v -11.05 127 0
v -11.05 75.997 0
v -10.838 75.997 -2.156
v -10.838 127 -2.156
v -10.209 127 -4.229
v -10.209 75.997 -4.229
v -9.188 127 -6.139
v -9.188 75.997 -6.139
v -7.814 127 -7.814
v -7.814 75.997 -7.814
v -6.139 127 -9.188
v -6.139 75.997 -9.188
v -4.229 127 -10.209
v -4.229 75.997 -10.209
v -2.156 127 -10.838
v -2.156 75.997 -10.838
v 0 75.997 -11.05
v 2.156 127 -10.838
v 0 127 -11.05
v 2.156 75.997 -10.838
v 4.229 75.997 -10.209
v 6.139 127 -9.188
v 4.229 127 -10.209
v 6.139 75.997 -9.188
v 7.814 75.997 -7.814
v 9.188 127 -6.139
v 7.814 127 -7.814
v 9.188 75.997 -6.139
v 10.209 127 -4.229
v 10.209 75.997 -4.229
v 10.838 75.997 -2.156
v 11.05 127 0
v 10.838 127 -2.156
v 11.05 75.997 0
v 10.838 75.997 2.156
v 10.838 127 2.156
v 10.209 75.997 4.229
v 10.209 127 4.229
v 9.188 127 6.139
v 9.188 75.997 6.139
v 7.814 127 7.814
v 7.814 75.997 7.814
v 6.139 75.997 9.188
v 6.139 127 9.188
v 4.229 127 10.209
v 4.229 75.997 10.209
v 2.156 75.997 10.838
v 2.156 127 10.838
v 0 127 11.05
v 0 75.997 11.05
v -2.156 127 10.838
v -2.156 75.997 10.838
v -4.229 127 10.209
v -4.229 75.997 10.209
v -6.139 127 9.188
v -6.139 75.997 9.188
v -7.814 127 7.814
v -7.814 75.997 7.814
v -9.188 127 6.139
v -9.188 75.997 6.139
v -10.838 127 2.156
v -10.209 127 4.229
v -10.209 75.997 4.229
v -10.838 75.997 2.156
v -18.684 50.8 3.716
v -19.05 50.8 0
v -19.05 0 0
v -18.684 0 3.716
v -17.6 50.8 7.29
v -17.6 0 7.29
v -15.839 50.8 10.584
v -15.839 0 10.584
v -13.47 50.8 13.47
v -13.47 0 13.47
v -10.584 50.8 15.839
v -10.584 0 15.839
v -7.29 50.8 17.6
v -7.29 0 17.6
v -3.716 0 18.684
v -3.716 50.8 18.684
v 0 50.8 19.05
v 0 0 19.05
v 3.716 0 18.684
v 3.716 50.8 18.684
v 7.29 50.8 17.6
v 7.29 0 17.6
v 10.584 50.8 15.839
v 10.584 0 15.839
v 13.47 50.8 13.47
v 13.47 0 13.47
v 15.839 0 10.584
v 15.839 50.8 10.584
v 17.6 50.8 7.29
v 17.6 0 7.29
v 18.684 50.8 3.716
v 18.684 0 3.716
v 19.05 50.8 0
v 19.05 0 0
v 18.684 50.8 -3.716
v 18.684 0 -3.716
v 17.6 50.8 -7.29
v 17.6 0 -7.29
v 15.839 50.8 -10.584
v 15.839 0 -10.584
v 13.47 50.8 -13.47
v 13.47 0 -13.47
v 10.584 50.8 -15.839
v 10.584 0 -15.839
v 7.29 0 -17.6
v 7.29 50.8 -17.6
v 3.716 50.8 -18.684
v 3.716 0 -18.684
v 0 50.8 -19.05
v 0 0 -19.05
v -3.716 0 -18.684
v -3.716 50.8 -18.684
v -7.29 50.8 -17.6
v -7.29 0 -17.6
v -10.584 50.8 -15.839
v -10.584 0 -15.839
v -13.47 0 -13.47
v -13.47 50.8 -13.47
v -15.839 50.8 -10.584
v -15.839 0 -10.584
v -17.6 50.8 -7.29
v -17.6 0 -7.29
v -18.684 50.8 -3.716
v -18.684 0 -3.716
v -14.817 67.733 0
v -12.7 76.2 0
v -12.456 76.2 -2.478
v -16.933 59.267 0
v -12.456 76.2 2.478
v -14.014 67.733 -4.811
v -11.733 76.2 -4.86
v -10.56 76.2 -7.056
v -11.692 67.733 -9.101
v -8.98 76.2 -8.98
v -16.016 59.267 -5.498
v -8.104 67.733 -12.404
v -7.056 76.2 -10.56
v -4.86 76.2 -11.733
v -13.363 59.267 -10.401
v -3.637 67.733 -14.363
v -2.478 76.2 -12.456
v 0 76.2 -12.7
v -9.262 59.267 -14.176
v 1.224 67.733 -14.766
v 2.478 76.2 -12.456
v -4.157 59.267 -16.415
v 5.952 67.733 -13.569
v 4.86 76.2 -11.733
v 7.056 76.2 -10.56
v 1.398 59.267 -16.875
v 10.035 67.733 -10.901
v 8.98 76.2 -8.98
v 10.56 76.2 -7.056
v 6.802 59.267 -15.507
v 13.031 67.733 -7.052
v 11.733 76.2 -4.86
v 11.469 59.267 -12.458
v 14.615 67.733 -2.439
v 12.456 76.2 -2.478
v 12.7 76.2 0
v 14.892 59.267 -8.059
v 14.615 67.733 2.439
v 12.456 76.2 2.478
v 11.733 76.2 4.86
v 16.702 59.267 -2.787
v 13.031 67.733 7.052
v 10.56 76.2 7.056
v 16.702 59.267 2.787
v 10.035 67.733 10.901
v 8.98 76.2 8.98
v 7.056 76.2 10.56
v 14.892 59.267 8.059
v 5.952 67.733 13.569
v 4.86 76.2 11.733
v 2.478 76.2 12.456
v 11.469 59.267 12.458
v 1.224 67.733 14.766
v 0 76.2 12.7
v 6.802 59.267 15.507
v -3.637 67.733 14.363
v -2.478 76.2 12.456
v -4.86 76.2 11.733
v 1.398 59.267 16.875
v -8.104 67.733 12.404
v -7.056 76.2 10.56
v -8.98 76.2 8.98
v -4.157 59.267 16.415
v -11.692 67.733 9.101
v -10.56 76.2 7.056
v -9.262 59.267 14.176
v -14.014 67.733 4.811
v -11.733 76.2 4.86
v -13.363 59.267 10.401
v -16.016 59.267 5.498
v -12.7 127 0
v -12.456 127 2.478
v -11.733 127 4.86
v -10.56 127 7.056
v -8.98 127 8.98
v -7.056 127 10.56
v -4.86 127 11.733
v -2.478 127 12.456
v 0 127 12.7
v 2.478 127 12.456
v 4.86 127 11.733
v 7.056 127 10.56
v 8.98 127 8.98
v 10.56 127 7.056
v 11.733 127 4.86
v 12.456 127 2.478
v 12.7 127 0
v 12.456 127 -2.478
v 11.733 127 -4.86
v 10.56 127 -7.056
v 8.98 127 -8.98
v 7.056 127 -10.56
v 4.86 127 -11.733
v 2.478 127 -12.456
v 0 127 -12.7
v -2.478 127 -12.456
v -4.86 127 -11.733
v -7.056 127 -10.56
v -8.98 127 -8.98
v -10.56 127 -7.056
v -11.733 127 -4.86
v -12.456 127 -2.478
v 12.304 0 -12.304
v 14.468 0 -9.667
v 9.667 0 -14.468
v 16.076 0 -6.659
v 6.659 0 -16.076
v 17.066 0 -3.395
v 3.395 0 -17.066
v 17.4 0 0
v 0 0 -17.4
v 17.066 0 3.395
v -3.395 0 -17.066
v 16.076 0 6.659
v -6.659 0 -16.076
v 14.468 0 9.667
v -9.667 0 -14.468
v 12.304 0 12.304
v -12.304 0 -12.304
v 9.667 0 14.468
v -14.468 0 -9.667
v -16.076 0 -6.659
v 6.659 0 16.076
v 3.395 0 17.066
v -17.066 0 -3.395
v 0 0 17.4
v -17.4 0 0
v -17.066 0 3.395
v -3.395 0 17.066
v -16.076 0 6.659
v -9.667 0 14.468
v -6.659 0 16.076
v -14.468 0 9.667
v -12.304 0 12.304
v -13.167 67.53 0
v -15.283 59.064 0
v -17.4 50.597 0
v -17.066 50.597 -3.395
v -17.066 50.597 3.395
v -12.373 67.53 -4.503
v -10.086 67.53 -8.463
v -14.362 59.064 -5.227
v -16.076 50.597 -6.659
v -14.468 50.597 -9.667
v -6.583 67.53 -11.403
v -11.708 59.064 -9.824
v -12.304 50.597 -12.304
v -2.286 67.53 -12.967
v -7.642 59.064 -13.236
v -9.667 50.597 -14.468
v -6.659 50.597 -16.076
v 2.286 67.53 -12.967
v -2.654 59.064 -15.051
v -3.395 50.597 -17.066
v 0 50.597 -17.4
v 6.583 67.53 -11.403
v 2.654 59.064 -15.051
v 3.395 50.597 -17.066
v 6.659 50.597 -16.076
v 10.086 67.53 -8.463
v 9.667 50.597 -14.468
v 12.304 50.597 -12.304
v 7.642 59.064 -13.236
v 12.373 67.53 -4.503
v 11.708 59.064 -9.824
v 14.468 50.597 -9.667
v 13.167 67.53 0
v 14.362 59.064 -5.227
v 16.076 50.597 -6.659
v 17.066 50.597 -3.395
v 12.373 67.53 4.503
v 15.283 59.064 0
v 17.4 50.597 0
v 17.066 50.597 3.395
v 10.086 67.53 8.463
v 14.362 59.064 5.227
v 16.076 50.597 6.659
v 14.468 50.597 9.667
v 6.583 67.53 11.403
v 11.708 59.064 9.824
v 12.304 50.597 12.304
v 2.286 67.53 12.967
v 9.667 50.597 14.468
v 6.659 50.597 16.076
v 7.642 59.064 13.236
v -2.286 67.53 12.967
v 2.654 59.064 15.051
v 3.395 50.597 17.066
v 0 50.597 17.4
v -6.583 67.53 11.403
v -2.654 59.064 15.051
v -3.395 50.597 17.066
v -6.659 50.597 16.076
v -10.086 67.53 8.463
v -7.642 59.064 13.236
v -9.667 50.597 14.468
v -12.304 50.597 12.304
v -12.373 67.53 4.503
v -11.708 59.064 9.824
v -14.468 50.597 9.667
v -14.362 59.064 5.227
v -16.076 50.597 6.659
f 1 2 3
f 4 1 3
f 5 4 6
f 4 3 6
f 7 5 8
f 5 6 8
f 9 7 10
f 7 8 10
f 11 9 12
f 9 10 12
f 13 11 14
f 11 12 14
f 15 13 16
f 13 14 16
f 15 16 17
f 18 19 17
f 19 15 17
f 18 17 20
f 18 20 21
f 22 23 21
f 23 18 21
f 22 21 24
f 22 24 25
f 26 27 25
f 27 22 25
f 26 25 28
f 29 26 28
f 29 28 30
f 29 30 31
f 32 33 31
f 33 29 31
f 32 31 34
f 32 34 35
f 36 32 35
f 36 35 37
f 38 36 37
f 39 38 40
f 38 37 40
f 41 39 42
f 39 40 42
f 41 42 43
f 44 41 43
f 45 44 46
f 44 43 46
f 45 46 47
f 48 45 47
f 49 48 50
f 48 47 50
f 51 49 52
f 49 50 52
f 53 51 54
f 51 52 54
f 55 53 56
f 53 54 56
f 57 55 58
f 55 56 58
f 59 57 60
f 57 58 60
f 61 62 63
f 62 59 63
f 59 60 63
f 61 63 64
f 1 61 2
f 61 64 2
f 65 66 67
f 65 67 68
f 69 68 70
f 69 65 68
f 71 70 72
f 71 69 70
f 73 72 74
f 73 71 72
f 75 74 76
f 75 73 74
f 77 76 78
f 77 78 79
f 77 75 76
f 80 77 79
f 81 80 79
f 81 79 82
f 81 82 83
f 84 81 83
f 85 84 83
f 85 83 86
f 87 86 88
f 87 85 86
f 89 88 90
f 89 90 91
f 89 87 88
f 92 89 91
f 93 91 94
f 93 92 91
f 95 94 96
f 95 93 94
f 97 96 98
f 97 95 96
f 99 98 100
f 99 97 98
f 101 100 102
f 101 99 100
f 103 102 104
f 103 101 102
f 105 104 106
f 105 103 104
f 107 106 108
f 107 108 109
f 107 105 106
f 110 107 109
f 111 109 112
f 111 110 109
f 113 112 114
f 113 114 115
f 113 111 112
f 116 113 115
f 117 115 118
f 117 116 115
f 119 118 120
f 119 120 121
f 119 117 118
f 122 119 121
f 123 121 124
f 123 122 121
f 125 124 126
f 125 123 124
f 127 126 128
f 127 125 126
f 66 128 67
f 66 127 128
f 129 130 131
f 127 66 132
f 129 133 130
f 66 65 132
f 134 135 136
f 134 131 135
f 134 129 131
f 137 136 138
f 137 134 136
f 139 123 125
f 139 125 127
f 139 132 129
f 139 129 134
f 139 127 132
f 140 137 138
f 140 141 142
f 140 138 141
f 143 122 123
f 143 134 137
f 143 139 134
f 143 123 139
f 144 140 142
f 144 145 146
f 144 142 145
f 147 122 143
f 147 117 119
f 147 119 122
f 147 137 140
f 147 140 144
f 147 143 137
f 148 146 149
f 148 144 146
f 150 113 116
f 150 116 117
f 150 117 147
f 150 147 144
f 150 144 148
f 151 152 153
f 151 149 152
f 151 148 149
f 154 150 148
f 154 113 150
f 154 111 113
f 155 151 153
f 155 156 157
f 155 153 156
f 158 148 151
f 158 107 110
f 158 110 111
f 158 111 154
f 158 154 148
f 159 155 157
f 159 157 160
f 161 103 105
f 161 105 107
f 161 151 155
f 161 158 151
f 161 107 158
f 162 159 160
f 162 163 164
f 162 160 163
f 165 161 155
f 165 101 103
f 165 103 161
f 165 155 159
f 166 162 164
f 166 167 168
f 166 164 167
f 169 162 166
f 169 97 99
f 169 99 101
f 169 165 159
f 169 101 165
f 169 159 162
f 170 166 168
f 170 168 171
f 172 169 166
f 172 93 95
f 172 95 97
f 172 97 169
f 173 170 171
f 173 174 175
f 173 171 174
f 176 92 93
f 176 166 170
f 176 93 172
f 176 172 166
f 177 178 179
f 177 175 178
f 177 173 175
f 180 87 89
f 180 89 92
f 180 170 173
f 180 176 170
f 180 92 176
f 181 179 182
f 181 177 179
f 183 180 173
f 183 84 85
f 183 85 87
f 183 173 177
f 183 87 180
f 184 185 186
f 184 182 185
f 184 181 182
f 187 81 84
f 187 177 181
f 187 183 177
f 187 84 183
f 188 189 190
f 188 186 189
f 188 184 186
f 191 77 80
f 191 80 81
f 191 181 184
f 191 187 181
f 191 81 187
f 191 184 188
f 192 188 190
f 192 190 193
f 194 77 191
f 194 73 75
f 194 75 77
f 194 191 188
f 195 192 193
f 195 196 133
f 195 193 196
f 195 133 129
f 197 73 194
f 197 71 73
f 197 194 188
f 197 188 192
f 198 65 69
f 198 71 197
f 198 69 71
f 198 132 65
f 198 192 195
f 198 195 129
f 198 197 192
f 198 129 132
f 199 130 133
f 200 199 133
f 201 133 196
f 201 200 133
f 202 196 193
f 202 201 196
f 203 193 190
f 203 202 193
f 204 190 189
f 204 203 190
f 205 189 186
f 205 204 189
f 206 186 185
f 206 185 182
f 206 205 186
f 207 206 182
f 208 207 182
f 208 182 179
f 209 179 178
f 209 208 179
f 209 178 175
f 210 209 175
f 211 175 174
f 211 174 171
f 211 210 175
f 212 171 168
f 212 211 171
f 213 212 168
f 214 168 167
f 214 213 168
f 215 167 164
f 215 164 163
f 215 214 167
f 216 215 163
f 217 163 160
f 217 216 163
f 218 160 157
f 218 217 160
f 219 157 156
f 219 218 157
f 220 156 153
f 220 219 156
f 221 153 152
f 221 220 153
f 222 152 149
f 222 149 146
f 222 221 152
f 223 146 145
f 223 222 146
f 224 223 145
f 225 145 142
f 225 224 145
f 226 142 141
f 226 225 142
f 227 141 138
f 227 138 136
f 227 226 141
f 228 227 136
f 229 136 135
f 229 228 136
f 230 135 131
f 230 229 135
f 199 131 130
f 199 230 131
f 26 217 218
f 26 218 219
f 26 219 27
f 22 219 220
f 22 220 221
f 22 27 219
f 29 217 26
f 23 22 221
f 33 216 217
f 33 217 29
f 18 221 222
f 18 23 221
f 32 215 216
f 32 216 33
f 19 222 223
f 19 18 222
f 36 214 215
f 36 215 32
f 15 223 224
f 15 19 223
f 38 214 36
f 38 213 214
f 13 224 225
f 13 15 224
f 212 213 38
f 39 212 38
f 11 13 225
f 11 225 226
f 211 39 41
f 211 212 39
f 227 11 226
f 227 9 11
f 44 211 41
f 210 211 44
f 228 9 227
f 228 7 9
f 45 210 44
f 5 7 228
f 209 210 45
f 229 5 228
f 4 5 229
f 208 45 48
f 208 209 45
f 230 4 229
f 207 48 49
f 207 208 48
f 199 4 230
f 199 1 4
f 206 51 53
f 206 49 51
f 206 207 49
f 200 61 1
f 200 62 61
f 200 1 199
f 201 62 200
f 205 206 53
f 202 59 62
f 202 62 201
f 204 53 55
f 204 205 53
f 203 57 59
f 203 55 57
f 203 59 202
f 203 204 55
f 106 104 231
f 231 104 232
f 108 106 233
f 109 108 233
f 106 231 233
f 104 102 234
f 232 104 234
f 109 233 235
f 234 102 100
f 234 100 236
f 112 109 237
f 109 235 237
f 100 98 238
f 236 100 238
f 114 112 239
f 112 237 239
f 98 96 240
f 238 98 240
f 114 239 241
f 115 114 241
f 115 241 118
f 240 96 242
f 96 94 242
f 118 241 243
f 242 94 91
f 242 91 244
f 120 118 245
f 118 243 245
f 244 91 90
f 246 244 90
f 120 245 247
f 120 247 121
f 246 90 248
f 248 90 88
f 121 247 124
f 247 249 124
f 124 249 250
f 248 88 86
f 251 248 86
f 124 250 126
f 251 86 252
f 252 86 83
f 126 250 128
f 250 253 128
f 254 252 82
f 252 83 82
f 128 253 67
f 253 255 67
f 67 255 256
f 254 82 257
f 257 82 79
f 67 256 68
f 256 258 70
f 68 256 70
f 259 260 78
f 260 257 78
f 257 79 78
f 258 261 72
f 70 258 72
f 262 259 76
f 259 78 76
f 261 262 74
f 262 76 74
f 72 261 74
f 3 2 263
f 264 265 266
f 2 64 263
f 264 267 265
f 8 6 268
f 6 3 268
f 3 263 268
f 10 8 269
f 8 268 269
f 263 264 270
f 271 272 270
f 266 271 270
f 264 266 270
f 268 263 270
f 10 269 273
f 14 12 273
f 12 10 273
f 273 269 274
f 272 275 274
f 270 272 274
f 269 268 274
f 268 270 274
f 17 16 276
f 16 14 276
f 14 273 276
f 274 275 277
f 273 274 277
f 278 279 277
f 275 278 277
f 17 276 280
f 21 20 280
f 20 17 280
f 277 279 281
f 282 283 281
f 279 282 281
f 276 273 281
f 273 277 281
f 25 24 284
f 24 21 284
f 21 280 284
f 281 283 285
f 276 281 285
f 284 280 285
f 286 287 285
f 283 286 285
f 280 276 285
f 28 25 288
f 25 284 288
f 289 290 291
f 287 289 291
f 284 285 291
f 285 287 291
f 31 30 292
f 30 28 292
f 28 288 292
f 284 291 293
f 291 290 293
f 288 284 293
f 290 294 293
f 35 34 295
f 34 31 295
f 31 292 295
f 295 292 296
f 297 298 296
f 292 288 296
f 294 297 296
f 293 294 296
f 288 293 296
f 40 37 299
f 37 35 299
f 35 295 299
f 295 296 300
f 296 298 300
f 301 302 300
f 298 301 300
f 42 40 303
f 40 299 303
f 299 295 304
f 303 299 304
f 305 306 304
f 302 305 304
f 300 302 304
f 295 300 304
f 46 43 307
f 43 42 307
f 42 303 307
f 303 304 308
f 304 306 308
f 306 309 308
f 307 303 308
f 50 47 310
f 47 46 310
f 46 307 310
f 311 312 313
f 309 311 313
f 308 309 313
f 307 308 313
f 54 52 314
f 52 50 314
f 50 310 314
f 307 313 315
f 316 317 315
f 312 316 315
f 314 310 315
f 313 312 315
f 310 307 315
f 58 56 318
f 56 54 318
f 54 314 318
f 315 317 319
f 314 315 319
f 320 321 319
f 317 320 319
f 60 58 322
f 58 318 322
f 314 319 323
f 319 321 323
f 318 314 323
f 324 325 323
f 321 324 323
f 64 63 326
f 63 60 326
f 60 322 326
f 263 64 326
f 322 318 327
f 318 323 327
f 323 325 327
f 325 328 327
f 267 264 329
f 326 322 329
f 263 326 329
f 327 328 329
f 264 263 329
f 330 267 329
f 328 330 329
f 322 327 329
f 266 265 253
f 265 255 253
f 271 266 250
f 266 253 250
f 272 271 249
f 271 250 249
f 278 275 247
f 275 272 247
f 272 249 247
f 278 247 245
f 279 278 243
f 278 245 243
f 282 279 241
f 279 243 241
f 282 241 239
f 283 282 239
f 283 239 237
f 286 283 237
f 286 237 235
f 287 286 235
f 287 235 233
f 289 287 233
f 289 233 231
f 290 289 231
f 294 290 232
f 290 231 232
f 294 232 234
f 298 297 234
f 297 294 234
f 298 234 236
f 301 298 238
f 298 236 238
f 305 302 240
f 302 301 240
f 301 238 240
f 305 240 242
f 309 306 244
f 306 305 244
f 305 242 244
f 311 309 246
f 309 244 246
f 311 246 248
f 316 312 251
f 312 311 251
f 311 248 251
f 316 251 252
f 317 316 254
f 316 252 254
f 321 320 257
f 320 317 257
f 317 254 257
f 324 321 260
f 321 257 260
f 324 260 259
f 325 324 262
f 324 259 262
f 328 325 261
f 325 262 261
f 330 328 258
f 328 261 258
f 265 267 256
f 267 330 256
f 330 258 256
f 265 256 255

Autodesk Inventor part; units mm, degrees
ref_plane "YZ Plane" through (0, 0, 0) normal (1, 0, 0) x (0, 1, 0)
ref_plane "XZ Plane" through (0, 0, 0) normal (0, 1, 0) x (-1, 0, 0)
ref_plane "XY Plane" through (0, 0, 0) normal (0, 0, 1) x (1, 0, 0)
sketch "Sketch1" plane through (0, 0, 0) normal (0, 0, 1) x (1, 0, 0)
  line L0 (0, 0) -> (0, 68.7718)
  line L1 (0, 0) -> (-35.2548, 0) construction
  line L2 (-19.05, 0) -> (-19.05, 50.8)
  line L3 (-19.05, 50.8) -> (-12.7, 76.2)
  line L4 (-12.7, 76.2) -> (-12.7, 127)
  line L5 (-11.05, 127) -> (-11.05, 75.9969)
  line L6 (-11.05, 75.9969) -> (-17.4, 50.5969)
  line L7 (-17.4, 50.5969) -> (-17.4, 0)
  line L8 (-19.05, 0) -> (-17.4, 0)
  line L9 (-12.7, 127) -> (-11.05, 127)
  dimension "d0" = 1.65
  dimension "d1" = 25.4
  dimension "d2" = 50.8
  dimension "d3" = 50.8
  dimension "d4" = 127
  dimension "d5" = 38.1
revolve "Revolution1" add sketch "Sketch1" angle 360 about axis through (0, 0, 0) along (0, 1, 0)
equation "\"d2\" = 0.4 * d4"
equation "\"d3\" = d2"
properties part number "ASME BPE CON RED-38.1-25.4"
